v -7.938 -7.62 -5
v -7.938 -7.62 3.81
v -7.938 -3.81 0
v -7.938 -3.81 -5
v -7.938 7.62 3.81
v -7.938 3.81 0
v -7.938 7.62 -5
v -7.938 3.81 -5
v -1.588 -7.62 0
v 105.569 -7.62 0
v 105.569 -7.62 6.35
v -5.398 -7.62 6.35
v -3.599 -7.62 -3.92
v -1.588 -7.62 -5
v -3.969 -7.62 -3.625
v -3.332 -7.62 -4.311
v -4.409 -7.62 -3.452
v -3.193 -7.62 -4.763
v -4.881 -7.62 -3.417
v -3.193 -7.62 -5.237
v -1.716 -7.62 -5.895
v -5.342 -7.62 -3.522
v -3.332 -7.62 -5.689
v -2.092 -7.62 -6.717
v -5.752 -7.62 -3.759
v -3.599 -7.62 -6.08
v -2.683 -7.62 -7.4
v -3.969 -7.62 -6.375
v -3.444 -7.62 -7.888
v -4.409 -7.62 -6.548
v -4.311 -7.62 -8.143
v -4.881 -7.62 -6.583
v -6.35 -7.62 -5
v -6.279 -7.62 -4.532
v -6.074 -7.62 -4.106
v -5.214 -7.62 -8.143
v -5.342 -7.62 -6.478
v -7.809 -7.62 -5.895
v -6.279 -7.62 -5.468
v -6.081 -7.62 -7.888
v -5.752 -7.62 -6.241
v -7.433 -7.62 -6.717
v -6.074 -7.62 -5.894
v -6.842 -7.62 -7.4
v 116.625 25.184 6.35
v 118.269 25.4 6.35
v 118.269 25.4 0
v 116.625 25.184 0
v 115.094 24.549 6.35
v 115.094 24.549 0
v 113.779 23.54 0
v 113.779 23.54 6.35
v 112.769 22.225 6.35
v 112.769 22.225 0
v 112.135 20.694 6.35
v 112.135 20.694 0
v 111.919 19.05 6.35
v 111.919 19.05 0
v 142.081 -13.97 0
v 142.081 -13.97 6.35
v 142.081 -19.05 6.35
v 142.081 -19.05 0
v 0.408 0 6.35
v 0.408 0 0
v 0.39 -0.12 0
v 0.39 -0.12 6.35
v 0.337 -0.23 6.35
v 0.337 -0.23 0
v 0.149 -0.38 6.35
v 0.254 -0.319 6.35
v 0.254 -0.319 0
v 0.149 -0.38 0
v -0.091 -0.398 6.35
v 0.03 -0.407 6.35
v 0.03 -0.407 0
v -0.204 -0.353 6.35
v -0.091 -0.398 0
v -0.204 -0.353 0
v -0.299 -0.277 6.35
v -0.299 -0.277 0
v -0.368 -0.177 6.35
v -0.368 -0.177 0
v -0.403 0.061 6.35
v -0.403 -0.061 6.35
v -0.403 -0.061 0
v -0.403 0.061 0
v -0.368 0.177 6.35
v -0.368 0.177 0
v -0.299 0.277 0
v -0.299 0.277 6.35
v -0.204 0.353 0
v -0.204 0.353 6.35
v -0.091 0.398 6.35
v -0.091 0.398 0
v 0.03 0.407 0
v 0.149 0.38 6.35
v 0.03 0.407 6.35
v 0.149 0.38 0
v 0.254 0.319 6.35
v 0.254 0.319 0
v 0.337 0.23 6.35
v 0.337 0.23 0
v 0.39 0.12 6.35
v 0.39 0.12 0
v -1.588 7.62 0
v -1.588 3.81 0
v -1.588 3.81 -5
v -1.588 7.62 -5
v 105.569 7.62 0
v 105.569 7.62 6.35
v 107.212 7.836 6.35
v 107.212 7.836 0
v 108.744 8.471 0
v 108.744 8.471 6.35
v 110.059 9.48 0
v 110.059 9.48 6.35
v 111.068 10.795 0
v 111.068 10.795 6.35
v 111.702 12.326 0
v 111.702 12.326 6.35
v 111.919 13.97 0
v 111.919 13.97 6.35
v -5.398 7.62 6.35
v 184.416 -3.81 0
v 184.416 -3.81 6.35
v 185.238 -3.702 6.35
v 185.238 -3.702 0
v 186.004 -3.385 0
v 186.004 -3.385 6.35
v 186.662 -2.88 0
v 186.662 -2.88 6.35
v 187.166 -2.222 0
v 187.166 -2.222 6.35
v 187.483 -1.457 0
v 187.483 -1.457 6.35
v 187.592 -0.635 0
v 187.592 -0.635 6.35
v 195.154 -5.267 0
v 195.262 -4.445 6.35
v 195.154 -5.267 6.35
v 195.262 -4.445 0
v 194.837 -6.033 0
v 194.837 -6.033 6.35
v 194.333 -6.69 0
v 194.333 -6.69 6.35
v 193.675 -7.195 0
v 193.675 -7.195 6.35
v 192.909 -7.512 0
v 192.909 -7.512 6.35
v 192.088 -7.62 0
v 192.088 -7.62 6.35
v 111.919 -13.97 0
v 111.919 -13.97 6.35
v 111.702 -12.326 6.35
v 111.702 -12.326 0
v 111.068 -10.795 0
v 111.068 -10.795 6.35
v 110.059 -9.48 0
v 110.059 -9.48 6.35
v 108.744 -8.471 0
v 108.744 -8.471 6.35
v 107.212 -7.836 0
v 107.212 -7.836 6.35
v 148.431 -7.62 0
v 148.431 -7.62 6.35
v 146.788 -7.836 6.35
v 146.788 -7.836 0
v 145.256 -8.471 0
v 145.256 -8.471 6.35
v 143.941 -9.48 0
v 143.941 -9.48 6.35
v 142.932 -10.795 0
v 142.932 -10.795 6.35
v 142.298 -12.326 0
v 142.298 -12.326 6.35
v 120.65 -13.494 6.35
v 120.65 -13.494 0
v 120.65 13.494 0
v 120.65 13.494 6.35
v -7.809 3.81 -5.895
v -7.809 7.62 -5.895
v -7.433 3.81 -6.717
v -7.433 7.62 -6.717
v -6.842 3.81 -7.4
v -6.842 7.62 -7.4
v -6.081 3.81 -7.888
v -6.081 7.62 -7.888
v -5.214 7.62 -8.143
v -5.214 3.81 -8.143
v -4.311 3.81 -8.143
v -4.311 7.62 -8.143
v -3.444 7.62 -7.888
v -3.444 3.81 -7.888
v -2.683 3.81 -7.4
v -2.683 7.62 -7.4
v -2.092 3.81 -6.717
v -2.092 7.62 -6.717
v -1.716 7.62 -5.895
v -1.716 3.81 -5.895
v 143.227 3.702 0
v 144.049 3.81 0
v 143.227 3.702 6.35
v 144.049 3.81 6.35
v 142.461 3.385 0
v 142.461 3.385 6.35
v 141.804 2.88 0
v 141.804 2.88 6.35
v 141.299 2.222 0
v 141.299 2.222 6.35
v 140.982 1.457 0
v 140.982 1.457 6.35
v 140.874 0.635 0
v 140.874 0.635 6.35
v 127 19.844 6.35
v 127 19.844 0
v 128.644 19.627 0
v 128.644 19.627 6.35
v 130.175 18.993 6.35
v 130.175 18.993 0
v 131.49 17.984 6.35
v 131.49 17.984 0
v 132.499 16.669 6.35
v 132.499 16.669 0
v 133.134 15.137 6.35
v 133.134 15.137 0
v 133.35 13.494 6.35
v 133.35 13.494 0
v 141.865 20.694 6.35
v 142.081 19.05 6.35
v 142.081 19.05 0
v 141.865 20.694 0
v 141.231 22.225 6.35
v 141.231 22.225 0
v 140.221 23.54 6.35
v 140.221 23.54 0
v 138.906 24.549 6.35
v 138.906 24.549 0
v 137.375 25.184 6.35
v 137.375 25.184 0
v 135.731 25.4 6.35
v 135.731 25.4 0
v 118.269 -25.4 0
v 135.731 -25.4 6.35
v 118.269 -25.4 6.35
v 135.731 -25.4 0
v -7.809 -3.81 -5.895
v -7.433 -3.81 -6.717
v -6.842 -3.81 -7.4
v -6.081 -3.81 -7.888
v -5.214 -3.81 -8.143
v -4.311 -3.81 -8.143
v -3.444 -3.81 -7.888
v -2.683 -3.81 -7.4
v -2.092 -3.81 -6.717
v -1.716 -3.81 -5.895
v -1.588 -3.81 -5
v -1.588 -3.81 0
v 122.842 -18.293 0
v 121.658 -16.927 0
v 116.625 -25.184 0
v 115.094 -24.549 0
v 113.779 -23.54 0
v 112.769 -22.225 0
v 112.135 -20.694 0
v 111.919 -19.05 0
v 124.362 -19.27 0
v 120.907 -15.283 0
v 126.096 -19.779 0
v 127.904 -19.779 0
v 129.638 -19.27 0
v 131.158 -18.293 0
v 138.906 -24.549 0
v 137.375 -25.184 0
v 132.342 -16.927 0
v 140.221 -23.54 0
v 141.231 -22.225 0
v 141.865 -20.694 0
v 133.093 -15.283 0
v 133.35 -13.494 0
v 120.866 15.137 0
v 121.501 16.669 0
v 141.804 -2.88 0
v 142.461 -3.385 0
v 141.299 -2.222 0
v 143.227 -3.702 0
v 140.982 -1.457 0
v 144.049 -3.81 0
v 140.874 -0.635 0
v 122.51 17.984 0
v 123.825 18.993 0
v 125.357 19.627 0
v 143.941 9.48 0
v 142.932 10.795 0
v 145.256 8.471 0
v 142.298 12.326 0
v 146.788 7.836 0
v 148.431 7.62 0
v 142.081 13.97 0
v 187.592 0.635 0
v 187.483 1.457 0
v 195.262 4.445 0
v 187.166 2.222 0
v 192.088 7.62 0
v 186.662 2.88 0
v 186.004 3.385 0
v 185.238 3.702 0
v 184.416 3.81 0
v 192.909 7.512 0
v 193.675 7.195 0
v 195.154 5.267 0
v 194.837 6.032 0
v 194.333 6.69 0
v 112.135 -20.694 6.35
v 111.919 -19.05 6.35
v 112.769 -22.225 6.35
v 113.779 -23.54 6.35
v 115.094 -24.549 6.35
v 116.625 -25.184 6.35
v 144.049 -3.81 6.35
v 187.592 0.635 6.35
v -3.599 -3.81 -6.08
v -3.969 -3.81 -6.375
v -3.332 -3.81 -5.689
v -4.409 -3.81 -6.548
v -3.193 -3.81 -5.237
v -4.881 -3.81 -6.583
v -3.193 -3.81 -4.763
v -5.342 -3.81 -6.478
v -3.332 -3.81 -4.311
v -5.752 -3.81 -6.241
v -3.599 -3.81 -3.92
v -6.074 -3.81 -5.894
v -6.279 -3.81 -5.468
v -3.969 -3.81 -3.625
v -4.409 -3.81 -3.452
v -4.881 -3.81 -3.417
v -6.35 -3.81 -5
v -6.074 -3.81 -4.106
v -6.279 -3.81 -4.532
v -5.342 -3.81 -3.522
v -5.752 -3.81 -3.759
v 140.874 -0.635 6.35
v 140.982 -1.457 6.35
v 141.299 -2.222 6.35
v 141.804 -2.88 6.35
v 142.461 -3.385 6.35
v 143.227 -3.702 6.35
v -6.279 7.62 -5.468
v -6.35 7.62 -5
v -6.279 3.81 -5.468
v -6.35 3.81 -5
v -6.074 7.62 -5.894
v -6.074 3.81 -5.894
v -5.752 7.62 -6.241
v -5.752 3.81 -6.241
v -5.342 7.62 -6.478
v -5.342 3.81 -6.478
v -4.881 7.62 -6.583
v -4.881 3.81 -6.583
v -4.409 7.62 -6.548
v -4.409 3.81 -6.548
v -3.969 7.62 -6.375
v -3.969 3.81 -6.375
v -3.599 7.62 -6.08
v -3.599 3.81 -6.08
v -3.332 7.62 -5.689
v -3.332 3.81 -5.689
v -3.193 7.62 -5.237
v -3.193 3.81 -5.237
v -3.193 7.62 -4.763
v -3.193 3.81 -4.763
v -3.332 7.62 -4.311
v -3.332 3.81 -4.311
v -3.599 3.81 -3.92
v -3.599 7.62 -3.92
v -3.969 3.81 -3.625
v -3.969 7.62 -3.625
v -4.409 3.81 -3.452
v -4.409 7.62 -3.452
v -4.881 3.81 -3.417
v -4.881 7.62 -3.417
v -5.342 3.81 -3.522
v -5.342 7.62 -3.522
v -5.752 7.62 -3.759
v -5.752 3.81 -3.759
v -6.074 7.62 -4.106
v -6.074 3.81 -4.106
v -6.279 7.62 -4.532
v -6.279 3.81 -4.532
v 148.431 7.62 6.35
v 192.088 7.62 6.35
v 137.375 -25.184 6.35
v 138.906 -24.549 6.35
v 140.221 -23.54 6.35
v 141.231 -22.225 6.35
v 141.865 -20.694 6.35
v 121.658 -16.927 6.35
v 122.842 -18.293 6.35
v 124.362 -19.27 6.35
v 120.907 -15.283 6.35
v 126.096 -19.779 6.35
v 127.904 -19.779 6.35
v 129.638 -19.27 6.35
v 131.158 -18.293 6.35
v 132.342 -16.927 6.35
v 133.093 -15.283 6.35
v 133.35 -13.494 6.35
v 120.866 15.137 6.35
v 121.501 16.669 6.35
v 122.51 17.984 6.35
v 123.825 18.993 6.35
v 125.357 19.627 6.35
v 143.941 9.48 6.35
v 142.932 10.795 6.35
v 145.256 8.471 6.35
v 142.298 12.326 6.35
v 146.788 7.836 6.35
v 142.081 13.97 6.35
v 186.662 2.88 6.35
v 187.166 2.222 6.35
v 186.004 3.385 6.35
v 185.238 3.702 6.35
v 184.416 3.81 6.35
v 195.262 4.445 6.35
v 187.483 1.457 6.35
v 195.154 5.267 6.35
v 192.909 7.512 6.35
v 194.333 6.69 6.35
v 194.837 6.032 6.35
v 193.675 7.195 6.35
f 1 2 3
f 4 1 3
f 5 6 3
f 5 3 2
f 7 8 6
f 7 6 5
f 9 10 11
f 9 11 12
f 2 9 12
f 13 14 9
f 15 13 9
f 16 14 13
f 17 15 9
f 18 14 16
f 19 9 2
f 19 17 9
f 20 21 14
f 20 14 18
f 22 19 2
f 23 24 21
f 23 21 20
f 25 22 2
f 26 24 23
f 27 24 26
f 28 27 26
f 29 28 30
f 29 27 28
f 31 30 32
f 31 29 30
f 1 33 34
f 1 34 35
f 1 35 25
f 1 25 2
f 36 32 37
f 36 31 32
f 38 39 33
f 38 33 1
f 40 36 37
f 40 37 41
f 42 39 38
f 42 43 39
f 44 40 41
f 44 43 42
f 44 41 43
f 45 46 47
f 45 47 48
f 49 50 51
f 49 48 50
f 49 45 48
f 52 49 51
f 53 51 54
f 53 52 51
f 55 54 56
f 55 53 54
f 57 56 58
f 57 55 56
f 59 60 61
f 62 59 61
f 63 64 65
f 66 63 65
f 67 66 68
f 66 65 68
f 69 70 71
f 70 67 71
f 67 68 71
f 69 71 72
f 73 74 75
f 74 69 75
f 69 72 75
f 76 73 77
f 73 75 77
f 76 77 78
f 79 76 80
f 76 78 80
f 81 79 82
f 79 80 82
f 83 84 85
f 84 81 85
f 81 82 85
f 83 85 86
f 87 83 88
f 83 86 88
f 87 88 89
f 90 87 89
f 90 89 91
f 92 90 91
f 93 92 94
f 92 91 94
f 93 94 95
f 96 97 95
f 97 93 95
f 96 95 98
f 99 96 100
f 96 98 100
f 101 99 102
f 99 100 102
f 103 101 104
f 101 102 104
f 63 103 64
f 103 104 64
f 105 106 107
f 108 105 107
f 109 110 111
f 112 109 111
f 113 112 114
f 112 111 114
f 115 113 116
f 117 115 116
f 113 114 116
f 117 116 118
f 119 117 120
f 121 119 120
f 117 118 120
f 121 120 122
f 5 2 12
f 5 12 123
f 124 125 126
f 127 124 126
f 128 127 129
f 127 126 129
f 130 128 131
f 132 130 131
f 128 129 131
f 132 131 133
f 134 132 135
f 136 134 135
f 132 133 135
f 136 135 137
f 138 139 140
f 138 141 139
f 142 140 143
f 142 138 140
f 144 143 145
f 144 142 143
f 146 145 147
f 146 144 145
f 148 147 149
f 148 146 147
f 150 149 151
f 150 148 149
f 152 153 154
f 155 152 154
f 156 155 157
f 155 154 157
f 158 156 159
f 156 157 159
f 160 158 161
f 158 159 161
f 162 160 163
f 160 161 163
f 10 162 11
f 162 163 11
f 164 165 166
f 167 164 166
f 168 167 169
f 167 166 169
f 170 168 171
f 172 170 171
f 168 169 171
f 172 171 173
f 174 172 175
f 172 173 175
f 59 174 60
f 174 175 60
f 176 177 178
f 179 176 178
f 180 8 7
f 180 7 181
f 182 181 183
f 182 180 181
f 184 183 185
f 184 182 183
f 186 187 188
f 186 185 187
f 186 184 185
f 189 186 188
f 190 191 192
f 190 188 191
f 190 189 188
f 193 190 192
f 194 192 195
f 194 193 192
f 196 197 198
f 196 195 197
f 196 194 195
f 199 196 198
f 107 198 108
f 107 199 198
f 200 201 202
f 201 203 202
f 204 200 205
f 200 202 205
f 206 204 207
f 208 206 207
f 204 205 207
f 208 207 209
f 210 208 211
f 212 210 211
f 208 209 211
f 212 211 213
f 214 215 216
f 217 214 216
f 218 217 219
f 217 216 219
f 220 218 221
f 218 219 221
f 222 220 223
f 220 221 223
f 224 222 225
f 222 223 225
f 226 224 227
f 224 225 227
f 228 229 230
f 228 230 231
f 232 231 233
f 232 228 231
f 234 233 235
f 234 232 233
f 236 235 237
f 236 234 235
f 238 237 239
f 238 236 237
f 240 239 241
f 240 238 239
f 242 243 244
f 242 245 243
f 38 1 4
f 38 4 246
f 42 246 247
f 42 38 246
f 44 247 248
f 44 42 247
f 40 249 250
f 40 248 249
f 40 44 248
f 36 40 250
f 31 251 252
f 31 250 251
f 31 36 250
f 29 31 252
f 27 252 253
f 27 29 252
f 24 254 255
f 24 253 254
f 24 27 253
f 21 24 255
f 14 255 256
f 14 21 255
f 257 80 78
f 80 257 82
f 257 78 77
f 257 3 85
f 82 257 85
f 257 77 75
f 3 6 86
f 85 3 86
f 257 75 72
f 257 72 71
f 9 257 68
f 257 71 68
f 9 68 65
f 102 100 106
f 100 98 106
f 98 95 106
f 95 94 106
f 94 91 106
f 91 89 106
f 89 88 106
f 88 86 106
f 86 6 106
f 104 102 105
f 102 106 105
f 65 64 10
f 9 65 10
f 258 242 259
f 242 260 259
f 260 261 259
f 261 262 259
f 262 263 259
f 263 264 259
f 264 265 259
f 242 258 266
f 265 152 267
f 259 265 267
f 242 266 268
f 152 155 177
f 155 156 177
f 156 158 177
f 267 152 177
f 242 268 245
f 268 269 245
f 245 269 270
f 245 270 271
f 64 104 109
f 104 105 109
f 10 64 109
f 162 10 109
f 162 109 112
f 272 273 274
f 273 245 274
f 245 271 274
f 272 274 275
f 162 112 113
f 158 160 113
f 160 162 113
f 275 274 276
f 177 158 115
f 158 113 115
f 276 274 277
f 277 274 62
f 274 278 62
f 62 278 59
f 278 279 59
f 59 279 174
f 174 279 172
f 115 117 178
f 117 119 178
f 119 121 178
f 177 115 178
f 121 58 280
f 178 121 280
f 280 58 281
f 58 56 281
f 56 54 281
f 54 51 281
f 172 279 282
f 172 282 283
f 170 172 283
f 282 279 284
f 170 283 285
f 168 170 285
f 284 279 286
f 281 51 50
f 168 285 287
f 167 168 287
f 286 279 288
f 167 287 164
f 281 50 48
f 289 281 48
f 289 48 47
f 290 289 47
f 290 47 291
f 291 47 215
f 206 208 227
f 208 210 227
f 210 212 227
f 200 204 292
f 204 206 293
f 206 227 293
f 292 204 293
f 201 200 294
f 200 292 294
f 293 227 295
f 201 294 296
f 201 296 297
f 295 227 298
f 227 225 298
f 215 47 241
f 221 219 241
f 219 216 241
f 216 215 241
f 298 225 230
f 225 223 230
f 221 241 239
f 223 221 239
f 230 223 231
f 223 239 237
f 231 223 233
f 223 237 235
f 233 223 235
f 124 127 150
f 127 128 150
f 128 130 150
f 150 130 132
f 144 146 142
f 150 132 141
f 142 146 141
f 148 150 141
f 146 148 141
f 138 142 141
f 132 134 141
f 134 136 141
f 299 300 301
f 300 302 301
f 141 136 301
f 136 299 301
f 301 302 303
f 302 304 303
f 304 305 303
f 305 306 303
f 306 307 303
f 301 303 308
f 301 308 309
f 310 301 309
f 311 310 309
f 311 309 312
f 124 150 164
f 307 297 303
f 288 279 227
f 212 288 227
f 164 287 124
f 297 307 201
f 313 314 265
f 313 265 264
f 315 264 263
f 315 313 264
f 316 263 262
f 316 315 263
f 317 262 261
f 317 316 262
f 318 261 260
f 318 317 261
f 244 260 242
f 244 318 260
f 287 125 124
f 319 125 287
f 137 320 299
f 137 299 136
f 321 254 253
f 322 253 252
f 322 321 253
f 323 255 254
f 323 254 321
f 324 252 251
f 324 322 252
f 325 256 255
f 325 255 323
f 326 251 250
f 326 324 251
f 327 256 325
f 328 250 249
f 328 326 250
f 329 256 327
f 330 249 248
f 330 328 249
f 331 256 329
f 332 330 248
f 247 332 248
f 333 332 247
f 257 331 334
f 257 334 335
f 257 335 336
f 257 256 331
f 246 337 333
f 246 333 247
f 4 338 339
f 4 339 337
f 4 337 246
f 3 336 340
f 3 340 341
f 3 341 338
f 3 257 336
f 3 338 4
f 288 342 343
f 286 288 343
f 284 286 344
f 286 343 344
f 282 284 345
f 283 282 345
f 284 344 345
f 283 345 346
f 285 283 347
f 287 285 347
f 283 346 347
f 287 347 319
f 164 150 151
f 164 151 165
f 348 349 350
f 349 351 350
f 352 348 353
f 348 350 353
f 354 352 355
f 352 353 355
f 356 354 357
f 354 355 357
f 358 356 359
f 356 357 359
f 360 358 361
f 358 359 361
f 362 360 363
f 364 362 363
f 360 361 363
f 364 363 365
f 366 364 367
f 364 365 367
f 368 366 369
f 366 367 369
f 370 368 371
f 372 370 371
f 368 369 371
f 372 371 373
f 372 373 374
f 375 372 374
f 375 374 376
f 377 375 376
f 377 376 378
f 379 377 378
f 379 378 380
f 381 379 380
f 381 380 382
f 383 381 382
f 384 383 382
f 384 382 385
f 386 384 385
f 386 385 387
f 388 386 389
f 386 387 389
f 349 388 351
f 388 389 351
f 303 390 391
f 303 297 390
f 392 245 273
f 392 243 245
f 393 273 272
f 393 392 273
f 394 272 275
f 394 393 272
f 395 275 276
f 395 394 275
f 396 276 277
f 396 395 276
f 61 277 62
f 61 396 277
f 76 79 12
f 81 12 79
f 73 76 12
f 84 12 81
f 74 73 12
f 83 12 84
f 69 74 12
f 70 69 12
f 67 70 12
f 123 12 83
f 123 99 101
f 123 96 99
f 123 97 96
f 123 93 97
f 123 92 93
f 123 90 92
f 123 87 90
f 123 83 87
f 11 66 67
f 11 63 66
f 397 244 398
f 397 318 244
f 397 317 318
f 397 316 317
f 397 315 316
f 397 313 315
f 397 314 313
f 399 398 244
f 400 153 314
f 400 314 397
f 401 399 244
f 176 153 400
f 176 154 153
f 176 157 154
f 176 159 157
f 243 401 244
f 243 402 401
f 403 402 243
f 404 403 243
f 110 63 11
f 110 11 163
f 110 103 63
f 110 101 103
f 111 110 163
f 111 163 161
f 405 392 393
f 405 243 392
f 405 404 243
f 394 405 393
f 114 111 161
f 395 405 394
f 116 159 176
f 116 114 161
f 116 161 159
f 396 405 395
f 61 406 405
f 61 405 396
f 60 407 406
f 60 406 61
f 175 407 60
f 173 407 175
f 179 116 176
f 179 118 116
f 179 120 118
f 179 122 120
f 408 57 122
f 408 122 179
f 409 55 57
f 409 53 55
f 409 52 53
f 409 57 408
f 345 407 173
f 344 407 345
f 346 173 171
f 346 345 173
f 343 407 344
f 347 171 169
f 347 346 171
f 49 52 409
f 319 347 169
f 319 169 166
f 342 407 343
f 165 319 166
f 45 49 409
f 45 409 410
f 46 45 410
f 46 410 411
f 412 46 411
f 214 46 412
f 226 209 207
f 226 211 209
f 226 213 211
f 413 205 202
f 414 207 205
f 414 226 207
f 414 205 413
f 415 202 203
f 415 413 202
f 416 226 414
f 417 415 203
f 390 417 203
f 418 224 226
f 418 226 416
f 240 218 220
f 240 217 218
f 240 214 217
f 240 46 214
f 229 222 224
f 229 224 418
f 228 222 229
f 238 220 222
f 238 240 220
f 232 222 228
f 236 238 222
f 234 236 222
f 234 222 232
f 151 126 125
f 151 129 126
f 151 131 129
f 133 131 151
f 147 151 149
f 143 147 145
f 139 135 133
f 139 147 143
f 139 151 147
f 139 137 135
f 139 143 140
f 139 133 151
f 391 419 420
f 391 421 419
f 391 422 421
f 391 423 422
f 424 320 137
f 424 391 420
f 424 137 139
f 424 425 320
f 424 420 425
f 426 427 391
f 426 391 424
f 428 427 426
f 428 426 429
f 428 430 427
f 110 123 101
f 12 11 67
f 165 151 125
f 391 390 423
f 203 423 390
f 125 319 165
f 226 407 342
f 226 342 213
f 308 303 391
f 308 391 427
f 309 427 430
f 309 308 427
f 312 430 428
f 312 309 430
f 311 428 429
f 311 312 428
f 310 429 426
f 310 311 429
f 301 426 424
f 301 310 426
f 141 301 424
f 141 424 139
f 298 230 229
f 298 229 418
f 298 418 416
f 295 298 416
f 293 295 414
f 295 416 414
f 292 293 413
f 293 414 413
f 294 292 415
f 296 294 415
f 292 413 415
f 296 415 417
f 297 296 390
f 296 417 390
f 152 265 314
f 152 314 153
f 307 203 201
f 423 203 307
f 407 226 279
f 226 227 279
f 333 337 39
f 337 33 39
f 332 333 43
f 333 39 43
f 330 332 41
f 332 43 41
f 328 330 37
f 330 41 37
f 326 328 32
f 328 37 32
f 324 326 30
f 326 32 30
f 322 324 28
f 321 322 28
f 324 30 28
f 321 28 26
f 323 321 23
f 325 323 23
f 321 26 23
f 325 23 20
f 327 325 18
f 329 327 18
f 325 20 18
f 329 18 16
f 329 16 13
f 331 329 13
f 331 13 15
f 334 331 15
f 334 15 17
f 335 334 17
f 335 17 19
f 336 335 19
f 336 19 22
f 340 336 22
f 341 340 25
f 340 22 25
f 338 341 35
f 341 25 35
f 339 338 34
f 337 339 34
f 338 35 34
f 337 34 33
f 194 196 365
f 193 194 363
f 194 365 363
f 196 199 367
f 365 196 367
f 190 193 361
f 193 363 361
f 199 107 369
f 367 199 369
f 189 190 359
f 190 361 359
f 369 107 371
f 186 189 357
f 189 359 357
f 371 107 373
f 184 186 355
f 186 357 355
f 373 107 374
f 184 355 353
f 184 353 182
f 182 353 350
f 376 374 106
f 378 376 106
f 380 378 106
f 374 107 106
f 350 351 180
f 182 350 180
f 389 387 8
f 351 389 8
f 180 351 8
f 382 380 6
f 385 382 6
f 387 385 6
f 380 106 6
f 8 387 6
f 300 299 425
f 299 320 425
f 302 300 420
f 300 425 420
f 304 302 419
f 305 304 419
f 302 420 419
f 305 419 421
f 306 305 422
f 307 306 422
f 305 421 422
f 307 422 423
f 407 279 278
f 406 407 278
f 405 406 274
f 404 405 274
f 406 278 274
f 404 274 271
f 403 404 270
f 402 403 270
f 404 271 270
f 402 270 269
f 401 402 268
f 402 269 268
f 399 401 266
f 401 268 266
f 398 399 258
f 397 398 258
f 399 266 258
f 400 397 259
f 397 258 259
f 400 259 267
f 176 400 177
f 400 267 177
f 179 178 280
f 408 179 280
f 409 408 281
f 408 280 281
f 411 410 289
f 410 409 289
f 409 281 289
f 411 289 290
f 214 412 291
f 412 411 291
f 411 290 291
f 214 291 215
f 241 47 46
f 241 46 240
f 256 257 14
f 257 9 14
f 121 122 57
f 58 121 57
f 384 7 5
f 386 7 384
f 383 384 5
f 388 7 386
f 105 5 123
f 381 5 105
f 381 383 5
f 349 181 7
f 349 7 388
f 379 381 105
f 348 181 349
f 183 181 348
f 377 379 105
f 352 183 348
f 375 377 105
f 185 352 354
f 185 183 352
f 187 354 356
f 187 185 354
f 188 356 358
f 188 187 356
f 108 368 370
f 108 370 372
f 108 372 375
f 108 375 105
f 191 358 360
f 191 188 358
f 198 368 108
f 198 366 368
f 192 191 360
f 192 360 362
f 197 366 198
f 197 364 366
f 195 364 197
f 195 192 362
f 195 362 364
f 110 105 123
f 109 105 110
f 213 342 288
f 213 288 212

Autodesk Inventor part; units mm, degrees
ref_plane "YZ Plane" through (0, 0, 0) normal (1, 0, 0) x (0, 1, 0)
ref_plane "XY Plane" through (0, 0, 0) normal (0, 0, 1) x (1, 0, 0)
sketch "Sketch1" plane through (0, 0, 0) normal (0, 0, 1) x (1, 0, 0)
  line L0 (195.2625, 4.445) -> (195.2625, -4.445)
  line L1 (-7.9375, -7.62) -> (-7.9375, 7.62)
  circle A0 centre (0, 0) radius 0.4079
  arc A1 (195.2625, 4.445) -> (192.0875, 7.62) centre (192.0875, 4.445) ccw
  arc A2 (192.0875, -7.62) -> (195.2625, -4.445) centre (192.0875, -4.445) ccw
  line L2 (111.9187, 25.4) -> (142.0813, 25.4)
  line L3 (142.0813, -25.4) -> (111.9187, -25.4)
  line L4 (127, 42.8625) -> (127, -39.6875) construction
  line L5 (127, 19.8437) -> (127, 19.8437)
  line L6 (133.35, 13.4937) -> (133.35, -13.4937)
  line L7 (127, -19.8437) -> (127, -19.8437)
  line L8 (120.65, -13.4937) -> (120.65, 13.4938)
  arc A3 (127, 19.8437) -> (120.65, 13.4938) centre (127, 13.4937) ccw
  arc A4 (133.35, 13.4937) -> (127, 19.8437) centre (127, 13.4937) ccw
  arc A5 (127, -19.8437) -> (133.35, -13.4937) centre (127, -13.4937) ccw
  arc A6 (120.65, -13.4937) -> (127, -19.8437) centre (127, -13.4937) ccw
  line L9 (-7.9375, 7.62) -> (111.9187, 7.62)
  line L10 (142.0813, 7.62) -> (192.0875, 7.62)
  line L11 (192.0875, -7.62) -> (142.0813, -7.62)
  line L12 (111.9187, -7.62) -> (-7.9375, -7.62)
  line L13 (111.9187, -25.4) -> (111.9187, -7.62)
  line L14 (111.9187, 7.62) -> (111.9187, 25.4)
  line L15 (142.0813, 25.4) -> (142.0813, 7.62)
  line L16 (142.0813, -7.62) -> (142.0813, -25.4)
  point P0 (-7.9375, 0)
  point P1 (127, 25.4)
  point P2 (111.9187, 0)
  point P3 (120.65, 0)
  dimension "d0" = 15.24
  dimension "d1" = 203.2
  dimension "d2" = 3.175
  dimension "d3" = 127
  dimension "d4" = 6.35
  dimension "d43" = 25.4
  dimension "d44" = 25.4
extrude "Extrusion1" add sketch "Sketch1" along normal blind 6.35
ref_plane "Work Plane3" through (127, 7.62, 0) normal (1, 0, 0) x (0, 0, -1)
fillet "Fillet1" radius 6.35 8 edges at (142.0813, -25.4, 3.175) (111.9187, -25.4, 3.175) (142.0813, 25.4, 3.175) (111.9187, 25.4, 3.175) (142.0813, -7.62, 3.175) (111.9187, -7.62, 3.175) (111.9187, 7.62, 3.175) (142.0813, 7.62, 3.175)
sketch "Sketch10" plane through (0, 0, 6.35) normal (0, 0, 1) x (1, 0, 0)
  line L0 (144.0488, 3.81) -> (184.4165, 3.81)
  line L1 (187.5915, 0.635) -> (187.5915, -0.635)
  line L2 (184.4165, -3.81) -> (144.0488, -3.81)
  line L3 (140.8738, -0.635) -> (140.8738, 0.635)
  arc A0 (111.9187, -19.05) -> (118.2688, -25.4) centre (118.2688, -19.05) ccw projected
  line L4 (135.7313, -25.4) -> (118.2688, -25.4) projected
  arc A1 (135.7313, -25.4) -> (142.0813, -19.05) centre (135.7313, -19.05) ccw projected
  arc A2 (148.4313, -7.62) -> (142.0813, -13.97) centre (148.4313, -13.97) ccw projected
  line L5 (192.0875, -7.62) -> (148.4313, -7.62) projected
  arc A3 (192.0875, -7.62) -> (195.2625, -4.445) centre (192.0875, -4.445) ccw projected
  line L6 (195.2625, 4.445) -> (195.2625, -4.445) projected
  arc A4 (195.2625, 4.445) -> (192.0875, 7.62) centre (192.0875, 4.445) ccw projected
  line L7 (148.4313, 7.62) -> (192.0875, 7.62) projected
  arc A5 (142.0813, 13.97) -> (148.4313, 7.62) centre (148.4313, 13.97) ccw projected
  arc A6 (142.0813, 19.05) -> (135.7313, 25.4) centre (135.7313, 19.05) ccw projected
  line L8 (118.2687, 25.4) -> (135.7313, 25.4) projected
  arc A7 (118.2687, 25.4) -> (111.9187, 19.05) centre (118.2687, 19.05) ccw projected
  arc A8 (105.5687, 7.62) -> (111.9187, 13.97) centre (105.5687, 13.97) ccw projected
  line L9 (-7.9375, 7.62) -> (105.5687, 7.62) projected
  line L10 (-7.9375, -7.62) -> (-7.9375, 7.62) projected
  line L11 (105.5687, -7.62) -> (-7.9375, -7.62) projected
  arc A9 (111.9187, -13.97) -> (105.5687, -7.62) centre (105.5687, -13.97) ccw projected
  arc A10 (133.35, 13.4937) -> (120.65, 13.4938) centre (127, 13.4937) ccw projected
  line L12 (133.35, 13.4937) -> (133.35, -13.4937) projected
  arc A11 (120.65, -13.4937) -> (133.35, -13.4937) centre (127, -13.4937) ccw projected
  line L13 (120.65, -13.4937) -> (120.65, 13.4938) projected
  circle A12 centre (0, 0) radius 0.4079 projected
  line L14 (-7.9375, 7.62) -> (82.3369, 7.62)
  line L15 (82.3369, 7.62) -> (89.9679, 7.62)
  line L16 (195.2625, 4.445) -> (195.2625, -4.445) projected
  arc A13 (144.0488, 3.81) -> (140.8738, 0.635) centre (144.0488, 0.635) ccw
  arc A14 (140.8738, -0.635) -> (144.0488, -3.81) centre (144.0488, -0.635) ccw
  arc A15 (187.5915, 0.635) -> (184.4165, 3.81) centre (184.4165, 0.635) ccw
  arc A16 (184.4165, -3.81) -> (187.5915, -0.635) centre (184.4165, -0.635) ccw
  line L17 (-7.9375, 0) -> (195.2625, 0)
  line L18 (-7.9375, -7.62) -> (82.3369, -7.62)
  line L19 (82.3369, -7.62) -> (89.9679, -7.62)
  line L20 (142.0813, -13.97) -> (142.0813, -19.05) projected
  line L21 (142.0813, 19.05) -> (142.0813, 13.97) projected
  line L22 (111.9187, 13.97) -> (111.9187, 19.05) projected
  line L23 (111.9187, -19.05) -> (111.9187, -13.97) projected
  point P0 (187.5915, 0)
  point P1 (140.8738, 0)
  dimension "d22" = 3.175
  dimension "d23" = 7.62
  dimension "d24" = 3.175
  dimension "d25" = 7.62
  dimension "d26" = 7.62
extrude "Extrusion7" cut sketch "Sketch10" against normal through all contours L0 A15 L1 L17 L3 A13 | L17 L1 A16 L2 A14 L3
sketch "Sketch7" plane through (0, 0, 0) normal (0, 1, 0) x (-1, 0, 0)
  line L0 (7.9375, 0) -> (7.9375, -5)
  line L1 (7.9375, 0) -> (-19.05, 0)
  line L2 (-111.9187, 0) -> (7.9375, 0) projected
  line L3 (7.9375, 0) -> (1.5875, 0)
  line L4 (1.5875, 0) -> (1.5875, -5)
  line L5 (7.9375, -5) -> (7.9375, 0)
  arc A0 (1.5875, -5) -> (7.9375, -5) centre (4.7625, -5) ccw
  circle A1 centre (4.7625, -5) radius 1.5875
  line L6 (1.5875, -5) -> (3.175, -5)
  line L7 (6.35, -5) -> (7.9375, -5)
  line L8 (7.9375, 0) -> (-111.9187, 0) projected
  point P0 (0, 0)
  point P1 (-89.9679, 0)
  dimension "d35" = 6.35
  dimension "d40" = 5
  dimension "d41" = 3.175
  dimension "d42" = 3.175
extrude "Extrusion9" add sketch "Sketch7" along normal mid plane 15.24 contours L0 L7 A1 L6 L4 L1 | A0 L6 A1 L7
sketch "Sketch12" plane through (0, 0, 0) normal (0, 1, 0) x (-1, 0, 0)
  line L0 (1.5875, 0) -> (7.9375, 0)
  arc A0 (1.5875, -5) -> (7.9375, -5) centre (4.7625, -5) ccw projected
  arc A1 (1.5875, -5) -> (7.9375, -5) centre (4.7625, -5) ccw projected
  line L1 (7.9375, 6.35) -> (7.9375, -5) projected
  line L2 (1.5875, -5) -> (1.5875, 0) projected
  point P0 (0, 0)
extrude "Extrusion11" cut sketch "Sketch12" against normal mid plane 7.62
chamfer "Chamfer1" distance 2.54 angle 45 1 edges at (-7.9375, 0, 6.35)
properties part number "Scottish Yoke" material "Steel, High Strength Low Alloy"
